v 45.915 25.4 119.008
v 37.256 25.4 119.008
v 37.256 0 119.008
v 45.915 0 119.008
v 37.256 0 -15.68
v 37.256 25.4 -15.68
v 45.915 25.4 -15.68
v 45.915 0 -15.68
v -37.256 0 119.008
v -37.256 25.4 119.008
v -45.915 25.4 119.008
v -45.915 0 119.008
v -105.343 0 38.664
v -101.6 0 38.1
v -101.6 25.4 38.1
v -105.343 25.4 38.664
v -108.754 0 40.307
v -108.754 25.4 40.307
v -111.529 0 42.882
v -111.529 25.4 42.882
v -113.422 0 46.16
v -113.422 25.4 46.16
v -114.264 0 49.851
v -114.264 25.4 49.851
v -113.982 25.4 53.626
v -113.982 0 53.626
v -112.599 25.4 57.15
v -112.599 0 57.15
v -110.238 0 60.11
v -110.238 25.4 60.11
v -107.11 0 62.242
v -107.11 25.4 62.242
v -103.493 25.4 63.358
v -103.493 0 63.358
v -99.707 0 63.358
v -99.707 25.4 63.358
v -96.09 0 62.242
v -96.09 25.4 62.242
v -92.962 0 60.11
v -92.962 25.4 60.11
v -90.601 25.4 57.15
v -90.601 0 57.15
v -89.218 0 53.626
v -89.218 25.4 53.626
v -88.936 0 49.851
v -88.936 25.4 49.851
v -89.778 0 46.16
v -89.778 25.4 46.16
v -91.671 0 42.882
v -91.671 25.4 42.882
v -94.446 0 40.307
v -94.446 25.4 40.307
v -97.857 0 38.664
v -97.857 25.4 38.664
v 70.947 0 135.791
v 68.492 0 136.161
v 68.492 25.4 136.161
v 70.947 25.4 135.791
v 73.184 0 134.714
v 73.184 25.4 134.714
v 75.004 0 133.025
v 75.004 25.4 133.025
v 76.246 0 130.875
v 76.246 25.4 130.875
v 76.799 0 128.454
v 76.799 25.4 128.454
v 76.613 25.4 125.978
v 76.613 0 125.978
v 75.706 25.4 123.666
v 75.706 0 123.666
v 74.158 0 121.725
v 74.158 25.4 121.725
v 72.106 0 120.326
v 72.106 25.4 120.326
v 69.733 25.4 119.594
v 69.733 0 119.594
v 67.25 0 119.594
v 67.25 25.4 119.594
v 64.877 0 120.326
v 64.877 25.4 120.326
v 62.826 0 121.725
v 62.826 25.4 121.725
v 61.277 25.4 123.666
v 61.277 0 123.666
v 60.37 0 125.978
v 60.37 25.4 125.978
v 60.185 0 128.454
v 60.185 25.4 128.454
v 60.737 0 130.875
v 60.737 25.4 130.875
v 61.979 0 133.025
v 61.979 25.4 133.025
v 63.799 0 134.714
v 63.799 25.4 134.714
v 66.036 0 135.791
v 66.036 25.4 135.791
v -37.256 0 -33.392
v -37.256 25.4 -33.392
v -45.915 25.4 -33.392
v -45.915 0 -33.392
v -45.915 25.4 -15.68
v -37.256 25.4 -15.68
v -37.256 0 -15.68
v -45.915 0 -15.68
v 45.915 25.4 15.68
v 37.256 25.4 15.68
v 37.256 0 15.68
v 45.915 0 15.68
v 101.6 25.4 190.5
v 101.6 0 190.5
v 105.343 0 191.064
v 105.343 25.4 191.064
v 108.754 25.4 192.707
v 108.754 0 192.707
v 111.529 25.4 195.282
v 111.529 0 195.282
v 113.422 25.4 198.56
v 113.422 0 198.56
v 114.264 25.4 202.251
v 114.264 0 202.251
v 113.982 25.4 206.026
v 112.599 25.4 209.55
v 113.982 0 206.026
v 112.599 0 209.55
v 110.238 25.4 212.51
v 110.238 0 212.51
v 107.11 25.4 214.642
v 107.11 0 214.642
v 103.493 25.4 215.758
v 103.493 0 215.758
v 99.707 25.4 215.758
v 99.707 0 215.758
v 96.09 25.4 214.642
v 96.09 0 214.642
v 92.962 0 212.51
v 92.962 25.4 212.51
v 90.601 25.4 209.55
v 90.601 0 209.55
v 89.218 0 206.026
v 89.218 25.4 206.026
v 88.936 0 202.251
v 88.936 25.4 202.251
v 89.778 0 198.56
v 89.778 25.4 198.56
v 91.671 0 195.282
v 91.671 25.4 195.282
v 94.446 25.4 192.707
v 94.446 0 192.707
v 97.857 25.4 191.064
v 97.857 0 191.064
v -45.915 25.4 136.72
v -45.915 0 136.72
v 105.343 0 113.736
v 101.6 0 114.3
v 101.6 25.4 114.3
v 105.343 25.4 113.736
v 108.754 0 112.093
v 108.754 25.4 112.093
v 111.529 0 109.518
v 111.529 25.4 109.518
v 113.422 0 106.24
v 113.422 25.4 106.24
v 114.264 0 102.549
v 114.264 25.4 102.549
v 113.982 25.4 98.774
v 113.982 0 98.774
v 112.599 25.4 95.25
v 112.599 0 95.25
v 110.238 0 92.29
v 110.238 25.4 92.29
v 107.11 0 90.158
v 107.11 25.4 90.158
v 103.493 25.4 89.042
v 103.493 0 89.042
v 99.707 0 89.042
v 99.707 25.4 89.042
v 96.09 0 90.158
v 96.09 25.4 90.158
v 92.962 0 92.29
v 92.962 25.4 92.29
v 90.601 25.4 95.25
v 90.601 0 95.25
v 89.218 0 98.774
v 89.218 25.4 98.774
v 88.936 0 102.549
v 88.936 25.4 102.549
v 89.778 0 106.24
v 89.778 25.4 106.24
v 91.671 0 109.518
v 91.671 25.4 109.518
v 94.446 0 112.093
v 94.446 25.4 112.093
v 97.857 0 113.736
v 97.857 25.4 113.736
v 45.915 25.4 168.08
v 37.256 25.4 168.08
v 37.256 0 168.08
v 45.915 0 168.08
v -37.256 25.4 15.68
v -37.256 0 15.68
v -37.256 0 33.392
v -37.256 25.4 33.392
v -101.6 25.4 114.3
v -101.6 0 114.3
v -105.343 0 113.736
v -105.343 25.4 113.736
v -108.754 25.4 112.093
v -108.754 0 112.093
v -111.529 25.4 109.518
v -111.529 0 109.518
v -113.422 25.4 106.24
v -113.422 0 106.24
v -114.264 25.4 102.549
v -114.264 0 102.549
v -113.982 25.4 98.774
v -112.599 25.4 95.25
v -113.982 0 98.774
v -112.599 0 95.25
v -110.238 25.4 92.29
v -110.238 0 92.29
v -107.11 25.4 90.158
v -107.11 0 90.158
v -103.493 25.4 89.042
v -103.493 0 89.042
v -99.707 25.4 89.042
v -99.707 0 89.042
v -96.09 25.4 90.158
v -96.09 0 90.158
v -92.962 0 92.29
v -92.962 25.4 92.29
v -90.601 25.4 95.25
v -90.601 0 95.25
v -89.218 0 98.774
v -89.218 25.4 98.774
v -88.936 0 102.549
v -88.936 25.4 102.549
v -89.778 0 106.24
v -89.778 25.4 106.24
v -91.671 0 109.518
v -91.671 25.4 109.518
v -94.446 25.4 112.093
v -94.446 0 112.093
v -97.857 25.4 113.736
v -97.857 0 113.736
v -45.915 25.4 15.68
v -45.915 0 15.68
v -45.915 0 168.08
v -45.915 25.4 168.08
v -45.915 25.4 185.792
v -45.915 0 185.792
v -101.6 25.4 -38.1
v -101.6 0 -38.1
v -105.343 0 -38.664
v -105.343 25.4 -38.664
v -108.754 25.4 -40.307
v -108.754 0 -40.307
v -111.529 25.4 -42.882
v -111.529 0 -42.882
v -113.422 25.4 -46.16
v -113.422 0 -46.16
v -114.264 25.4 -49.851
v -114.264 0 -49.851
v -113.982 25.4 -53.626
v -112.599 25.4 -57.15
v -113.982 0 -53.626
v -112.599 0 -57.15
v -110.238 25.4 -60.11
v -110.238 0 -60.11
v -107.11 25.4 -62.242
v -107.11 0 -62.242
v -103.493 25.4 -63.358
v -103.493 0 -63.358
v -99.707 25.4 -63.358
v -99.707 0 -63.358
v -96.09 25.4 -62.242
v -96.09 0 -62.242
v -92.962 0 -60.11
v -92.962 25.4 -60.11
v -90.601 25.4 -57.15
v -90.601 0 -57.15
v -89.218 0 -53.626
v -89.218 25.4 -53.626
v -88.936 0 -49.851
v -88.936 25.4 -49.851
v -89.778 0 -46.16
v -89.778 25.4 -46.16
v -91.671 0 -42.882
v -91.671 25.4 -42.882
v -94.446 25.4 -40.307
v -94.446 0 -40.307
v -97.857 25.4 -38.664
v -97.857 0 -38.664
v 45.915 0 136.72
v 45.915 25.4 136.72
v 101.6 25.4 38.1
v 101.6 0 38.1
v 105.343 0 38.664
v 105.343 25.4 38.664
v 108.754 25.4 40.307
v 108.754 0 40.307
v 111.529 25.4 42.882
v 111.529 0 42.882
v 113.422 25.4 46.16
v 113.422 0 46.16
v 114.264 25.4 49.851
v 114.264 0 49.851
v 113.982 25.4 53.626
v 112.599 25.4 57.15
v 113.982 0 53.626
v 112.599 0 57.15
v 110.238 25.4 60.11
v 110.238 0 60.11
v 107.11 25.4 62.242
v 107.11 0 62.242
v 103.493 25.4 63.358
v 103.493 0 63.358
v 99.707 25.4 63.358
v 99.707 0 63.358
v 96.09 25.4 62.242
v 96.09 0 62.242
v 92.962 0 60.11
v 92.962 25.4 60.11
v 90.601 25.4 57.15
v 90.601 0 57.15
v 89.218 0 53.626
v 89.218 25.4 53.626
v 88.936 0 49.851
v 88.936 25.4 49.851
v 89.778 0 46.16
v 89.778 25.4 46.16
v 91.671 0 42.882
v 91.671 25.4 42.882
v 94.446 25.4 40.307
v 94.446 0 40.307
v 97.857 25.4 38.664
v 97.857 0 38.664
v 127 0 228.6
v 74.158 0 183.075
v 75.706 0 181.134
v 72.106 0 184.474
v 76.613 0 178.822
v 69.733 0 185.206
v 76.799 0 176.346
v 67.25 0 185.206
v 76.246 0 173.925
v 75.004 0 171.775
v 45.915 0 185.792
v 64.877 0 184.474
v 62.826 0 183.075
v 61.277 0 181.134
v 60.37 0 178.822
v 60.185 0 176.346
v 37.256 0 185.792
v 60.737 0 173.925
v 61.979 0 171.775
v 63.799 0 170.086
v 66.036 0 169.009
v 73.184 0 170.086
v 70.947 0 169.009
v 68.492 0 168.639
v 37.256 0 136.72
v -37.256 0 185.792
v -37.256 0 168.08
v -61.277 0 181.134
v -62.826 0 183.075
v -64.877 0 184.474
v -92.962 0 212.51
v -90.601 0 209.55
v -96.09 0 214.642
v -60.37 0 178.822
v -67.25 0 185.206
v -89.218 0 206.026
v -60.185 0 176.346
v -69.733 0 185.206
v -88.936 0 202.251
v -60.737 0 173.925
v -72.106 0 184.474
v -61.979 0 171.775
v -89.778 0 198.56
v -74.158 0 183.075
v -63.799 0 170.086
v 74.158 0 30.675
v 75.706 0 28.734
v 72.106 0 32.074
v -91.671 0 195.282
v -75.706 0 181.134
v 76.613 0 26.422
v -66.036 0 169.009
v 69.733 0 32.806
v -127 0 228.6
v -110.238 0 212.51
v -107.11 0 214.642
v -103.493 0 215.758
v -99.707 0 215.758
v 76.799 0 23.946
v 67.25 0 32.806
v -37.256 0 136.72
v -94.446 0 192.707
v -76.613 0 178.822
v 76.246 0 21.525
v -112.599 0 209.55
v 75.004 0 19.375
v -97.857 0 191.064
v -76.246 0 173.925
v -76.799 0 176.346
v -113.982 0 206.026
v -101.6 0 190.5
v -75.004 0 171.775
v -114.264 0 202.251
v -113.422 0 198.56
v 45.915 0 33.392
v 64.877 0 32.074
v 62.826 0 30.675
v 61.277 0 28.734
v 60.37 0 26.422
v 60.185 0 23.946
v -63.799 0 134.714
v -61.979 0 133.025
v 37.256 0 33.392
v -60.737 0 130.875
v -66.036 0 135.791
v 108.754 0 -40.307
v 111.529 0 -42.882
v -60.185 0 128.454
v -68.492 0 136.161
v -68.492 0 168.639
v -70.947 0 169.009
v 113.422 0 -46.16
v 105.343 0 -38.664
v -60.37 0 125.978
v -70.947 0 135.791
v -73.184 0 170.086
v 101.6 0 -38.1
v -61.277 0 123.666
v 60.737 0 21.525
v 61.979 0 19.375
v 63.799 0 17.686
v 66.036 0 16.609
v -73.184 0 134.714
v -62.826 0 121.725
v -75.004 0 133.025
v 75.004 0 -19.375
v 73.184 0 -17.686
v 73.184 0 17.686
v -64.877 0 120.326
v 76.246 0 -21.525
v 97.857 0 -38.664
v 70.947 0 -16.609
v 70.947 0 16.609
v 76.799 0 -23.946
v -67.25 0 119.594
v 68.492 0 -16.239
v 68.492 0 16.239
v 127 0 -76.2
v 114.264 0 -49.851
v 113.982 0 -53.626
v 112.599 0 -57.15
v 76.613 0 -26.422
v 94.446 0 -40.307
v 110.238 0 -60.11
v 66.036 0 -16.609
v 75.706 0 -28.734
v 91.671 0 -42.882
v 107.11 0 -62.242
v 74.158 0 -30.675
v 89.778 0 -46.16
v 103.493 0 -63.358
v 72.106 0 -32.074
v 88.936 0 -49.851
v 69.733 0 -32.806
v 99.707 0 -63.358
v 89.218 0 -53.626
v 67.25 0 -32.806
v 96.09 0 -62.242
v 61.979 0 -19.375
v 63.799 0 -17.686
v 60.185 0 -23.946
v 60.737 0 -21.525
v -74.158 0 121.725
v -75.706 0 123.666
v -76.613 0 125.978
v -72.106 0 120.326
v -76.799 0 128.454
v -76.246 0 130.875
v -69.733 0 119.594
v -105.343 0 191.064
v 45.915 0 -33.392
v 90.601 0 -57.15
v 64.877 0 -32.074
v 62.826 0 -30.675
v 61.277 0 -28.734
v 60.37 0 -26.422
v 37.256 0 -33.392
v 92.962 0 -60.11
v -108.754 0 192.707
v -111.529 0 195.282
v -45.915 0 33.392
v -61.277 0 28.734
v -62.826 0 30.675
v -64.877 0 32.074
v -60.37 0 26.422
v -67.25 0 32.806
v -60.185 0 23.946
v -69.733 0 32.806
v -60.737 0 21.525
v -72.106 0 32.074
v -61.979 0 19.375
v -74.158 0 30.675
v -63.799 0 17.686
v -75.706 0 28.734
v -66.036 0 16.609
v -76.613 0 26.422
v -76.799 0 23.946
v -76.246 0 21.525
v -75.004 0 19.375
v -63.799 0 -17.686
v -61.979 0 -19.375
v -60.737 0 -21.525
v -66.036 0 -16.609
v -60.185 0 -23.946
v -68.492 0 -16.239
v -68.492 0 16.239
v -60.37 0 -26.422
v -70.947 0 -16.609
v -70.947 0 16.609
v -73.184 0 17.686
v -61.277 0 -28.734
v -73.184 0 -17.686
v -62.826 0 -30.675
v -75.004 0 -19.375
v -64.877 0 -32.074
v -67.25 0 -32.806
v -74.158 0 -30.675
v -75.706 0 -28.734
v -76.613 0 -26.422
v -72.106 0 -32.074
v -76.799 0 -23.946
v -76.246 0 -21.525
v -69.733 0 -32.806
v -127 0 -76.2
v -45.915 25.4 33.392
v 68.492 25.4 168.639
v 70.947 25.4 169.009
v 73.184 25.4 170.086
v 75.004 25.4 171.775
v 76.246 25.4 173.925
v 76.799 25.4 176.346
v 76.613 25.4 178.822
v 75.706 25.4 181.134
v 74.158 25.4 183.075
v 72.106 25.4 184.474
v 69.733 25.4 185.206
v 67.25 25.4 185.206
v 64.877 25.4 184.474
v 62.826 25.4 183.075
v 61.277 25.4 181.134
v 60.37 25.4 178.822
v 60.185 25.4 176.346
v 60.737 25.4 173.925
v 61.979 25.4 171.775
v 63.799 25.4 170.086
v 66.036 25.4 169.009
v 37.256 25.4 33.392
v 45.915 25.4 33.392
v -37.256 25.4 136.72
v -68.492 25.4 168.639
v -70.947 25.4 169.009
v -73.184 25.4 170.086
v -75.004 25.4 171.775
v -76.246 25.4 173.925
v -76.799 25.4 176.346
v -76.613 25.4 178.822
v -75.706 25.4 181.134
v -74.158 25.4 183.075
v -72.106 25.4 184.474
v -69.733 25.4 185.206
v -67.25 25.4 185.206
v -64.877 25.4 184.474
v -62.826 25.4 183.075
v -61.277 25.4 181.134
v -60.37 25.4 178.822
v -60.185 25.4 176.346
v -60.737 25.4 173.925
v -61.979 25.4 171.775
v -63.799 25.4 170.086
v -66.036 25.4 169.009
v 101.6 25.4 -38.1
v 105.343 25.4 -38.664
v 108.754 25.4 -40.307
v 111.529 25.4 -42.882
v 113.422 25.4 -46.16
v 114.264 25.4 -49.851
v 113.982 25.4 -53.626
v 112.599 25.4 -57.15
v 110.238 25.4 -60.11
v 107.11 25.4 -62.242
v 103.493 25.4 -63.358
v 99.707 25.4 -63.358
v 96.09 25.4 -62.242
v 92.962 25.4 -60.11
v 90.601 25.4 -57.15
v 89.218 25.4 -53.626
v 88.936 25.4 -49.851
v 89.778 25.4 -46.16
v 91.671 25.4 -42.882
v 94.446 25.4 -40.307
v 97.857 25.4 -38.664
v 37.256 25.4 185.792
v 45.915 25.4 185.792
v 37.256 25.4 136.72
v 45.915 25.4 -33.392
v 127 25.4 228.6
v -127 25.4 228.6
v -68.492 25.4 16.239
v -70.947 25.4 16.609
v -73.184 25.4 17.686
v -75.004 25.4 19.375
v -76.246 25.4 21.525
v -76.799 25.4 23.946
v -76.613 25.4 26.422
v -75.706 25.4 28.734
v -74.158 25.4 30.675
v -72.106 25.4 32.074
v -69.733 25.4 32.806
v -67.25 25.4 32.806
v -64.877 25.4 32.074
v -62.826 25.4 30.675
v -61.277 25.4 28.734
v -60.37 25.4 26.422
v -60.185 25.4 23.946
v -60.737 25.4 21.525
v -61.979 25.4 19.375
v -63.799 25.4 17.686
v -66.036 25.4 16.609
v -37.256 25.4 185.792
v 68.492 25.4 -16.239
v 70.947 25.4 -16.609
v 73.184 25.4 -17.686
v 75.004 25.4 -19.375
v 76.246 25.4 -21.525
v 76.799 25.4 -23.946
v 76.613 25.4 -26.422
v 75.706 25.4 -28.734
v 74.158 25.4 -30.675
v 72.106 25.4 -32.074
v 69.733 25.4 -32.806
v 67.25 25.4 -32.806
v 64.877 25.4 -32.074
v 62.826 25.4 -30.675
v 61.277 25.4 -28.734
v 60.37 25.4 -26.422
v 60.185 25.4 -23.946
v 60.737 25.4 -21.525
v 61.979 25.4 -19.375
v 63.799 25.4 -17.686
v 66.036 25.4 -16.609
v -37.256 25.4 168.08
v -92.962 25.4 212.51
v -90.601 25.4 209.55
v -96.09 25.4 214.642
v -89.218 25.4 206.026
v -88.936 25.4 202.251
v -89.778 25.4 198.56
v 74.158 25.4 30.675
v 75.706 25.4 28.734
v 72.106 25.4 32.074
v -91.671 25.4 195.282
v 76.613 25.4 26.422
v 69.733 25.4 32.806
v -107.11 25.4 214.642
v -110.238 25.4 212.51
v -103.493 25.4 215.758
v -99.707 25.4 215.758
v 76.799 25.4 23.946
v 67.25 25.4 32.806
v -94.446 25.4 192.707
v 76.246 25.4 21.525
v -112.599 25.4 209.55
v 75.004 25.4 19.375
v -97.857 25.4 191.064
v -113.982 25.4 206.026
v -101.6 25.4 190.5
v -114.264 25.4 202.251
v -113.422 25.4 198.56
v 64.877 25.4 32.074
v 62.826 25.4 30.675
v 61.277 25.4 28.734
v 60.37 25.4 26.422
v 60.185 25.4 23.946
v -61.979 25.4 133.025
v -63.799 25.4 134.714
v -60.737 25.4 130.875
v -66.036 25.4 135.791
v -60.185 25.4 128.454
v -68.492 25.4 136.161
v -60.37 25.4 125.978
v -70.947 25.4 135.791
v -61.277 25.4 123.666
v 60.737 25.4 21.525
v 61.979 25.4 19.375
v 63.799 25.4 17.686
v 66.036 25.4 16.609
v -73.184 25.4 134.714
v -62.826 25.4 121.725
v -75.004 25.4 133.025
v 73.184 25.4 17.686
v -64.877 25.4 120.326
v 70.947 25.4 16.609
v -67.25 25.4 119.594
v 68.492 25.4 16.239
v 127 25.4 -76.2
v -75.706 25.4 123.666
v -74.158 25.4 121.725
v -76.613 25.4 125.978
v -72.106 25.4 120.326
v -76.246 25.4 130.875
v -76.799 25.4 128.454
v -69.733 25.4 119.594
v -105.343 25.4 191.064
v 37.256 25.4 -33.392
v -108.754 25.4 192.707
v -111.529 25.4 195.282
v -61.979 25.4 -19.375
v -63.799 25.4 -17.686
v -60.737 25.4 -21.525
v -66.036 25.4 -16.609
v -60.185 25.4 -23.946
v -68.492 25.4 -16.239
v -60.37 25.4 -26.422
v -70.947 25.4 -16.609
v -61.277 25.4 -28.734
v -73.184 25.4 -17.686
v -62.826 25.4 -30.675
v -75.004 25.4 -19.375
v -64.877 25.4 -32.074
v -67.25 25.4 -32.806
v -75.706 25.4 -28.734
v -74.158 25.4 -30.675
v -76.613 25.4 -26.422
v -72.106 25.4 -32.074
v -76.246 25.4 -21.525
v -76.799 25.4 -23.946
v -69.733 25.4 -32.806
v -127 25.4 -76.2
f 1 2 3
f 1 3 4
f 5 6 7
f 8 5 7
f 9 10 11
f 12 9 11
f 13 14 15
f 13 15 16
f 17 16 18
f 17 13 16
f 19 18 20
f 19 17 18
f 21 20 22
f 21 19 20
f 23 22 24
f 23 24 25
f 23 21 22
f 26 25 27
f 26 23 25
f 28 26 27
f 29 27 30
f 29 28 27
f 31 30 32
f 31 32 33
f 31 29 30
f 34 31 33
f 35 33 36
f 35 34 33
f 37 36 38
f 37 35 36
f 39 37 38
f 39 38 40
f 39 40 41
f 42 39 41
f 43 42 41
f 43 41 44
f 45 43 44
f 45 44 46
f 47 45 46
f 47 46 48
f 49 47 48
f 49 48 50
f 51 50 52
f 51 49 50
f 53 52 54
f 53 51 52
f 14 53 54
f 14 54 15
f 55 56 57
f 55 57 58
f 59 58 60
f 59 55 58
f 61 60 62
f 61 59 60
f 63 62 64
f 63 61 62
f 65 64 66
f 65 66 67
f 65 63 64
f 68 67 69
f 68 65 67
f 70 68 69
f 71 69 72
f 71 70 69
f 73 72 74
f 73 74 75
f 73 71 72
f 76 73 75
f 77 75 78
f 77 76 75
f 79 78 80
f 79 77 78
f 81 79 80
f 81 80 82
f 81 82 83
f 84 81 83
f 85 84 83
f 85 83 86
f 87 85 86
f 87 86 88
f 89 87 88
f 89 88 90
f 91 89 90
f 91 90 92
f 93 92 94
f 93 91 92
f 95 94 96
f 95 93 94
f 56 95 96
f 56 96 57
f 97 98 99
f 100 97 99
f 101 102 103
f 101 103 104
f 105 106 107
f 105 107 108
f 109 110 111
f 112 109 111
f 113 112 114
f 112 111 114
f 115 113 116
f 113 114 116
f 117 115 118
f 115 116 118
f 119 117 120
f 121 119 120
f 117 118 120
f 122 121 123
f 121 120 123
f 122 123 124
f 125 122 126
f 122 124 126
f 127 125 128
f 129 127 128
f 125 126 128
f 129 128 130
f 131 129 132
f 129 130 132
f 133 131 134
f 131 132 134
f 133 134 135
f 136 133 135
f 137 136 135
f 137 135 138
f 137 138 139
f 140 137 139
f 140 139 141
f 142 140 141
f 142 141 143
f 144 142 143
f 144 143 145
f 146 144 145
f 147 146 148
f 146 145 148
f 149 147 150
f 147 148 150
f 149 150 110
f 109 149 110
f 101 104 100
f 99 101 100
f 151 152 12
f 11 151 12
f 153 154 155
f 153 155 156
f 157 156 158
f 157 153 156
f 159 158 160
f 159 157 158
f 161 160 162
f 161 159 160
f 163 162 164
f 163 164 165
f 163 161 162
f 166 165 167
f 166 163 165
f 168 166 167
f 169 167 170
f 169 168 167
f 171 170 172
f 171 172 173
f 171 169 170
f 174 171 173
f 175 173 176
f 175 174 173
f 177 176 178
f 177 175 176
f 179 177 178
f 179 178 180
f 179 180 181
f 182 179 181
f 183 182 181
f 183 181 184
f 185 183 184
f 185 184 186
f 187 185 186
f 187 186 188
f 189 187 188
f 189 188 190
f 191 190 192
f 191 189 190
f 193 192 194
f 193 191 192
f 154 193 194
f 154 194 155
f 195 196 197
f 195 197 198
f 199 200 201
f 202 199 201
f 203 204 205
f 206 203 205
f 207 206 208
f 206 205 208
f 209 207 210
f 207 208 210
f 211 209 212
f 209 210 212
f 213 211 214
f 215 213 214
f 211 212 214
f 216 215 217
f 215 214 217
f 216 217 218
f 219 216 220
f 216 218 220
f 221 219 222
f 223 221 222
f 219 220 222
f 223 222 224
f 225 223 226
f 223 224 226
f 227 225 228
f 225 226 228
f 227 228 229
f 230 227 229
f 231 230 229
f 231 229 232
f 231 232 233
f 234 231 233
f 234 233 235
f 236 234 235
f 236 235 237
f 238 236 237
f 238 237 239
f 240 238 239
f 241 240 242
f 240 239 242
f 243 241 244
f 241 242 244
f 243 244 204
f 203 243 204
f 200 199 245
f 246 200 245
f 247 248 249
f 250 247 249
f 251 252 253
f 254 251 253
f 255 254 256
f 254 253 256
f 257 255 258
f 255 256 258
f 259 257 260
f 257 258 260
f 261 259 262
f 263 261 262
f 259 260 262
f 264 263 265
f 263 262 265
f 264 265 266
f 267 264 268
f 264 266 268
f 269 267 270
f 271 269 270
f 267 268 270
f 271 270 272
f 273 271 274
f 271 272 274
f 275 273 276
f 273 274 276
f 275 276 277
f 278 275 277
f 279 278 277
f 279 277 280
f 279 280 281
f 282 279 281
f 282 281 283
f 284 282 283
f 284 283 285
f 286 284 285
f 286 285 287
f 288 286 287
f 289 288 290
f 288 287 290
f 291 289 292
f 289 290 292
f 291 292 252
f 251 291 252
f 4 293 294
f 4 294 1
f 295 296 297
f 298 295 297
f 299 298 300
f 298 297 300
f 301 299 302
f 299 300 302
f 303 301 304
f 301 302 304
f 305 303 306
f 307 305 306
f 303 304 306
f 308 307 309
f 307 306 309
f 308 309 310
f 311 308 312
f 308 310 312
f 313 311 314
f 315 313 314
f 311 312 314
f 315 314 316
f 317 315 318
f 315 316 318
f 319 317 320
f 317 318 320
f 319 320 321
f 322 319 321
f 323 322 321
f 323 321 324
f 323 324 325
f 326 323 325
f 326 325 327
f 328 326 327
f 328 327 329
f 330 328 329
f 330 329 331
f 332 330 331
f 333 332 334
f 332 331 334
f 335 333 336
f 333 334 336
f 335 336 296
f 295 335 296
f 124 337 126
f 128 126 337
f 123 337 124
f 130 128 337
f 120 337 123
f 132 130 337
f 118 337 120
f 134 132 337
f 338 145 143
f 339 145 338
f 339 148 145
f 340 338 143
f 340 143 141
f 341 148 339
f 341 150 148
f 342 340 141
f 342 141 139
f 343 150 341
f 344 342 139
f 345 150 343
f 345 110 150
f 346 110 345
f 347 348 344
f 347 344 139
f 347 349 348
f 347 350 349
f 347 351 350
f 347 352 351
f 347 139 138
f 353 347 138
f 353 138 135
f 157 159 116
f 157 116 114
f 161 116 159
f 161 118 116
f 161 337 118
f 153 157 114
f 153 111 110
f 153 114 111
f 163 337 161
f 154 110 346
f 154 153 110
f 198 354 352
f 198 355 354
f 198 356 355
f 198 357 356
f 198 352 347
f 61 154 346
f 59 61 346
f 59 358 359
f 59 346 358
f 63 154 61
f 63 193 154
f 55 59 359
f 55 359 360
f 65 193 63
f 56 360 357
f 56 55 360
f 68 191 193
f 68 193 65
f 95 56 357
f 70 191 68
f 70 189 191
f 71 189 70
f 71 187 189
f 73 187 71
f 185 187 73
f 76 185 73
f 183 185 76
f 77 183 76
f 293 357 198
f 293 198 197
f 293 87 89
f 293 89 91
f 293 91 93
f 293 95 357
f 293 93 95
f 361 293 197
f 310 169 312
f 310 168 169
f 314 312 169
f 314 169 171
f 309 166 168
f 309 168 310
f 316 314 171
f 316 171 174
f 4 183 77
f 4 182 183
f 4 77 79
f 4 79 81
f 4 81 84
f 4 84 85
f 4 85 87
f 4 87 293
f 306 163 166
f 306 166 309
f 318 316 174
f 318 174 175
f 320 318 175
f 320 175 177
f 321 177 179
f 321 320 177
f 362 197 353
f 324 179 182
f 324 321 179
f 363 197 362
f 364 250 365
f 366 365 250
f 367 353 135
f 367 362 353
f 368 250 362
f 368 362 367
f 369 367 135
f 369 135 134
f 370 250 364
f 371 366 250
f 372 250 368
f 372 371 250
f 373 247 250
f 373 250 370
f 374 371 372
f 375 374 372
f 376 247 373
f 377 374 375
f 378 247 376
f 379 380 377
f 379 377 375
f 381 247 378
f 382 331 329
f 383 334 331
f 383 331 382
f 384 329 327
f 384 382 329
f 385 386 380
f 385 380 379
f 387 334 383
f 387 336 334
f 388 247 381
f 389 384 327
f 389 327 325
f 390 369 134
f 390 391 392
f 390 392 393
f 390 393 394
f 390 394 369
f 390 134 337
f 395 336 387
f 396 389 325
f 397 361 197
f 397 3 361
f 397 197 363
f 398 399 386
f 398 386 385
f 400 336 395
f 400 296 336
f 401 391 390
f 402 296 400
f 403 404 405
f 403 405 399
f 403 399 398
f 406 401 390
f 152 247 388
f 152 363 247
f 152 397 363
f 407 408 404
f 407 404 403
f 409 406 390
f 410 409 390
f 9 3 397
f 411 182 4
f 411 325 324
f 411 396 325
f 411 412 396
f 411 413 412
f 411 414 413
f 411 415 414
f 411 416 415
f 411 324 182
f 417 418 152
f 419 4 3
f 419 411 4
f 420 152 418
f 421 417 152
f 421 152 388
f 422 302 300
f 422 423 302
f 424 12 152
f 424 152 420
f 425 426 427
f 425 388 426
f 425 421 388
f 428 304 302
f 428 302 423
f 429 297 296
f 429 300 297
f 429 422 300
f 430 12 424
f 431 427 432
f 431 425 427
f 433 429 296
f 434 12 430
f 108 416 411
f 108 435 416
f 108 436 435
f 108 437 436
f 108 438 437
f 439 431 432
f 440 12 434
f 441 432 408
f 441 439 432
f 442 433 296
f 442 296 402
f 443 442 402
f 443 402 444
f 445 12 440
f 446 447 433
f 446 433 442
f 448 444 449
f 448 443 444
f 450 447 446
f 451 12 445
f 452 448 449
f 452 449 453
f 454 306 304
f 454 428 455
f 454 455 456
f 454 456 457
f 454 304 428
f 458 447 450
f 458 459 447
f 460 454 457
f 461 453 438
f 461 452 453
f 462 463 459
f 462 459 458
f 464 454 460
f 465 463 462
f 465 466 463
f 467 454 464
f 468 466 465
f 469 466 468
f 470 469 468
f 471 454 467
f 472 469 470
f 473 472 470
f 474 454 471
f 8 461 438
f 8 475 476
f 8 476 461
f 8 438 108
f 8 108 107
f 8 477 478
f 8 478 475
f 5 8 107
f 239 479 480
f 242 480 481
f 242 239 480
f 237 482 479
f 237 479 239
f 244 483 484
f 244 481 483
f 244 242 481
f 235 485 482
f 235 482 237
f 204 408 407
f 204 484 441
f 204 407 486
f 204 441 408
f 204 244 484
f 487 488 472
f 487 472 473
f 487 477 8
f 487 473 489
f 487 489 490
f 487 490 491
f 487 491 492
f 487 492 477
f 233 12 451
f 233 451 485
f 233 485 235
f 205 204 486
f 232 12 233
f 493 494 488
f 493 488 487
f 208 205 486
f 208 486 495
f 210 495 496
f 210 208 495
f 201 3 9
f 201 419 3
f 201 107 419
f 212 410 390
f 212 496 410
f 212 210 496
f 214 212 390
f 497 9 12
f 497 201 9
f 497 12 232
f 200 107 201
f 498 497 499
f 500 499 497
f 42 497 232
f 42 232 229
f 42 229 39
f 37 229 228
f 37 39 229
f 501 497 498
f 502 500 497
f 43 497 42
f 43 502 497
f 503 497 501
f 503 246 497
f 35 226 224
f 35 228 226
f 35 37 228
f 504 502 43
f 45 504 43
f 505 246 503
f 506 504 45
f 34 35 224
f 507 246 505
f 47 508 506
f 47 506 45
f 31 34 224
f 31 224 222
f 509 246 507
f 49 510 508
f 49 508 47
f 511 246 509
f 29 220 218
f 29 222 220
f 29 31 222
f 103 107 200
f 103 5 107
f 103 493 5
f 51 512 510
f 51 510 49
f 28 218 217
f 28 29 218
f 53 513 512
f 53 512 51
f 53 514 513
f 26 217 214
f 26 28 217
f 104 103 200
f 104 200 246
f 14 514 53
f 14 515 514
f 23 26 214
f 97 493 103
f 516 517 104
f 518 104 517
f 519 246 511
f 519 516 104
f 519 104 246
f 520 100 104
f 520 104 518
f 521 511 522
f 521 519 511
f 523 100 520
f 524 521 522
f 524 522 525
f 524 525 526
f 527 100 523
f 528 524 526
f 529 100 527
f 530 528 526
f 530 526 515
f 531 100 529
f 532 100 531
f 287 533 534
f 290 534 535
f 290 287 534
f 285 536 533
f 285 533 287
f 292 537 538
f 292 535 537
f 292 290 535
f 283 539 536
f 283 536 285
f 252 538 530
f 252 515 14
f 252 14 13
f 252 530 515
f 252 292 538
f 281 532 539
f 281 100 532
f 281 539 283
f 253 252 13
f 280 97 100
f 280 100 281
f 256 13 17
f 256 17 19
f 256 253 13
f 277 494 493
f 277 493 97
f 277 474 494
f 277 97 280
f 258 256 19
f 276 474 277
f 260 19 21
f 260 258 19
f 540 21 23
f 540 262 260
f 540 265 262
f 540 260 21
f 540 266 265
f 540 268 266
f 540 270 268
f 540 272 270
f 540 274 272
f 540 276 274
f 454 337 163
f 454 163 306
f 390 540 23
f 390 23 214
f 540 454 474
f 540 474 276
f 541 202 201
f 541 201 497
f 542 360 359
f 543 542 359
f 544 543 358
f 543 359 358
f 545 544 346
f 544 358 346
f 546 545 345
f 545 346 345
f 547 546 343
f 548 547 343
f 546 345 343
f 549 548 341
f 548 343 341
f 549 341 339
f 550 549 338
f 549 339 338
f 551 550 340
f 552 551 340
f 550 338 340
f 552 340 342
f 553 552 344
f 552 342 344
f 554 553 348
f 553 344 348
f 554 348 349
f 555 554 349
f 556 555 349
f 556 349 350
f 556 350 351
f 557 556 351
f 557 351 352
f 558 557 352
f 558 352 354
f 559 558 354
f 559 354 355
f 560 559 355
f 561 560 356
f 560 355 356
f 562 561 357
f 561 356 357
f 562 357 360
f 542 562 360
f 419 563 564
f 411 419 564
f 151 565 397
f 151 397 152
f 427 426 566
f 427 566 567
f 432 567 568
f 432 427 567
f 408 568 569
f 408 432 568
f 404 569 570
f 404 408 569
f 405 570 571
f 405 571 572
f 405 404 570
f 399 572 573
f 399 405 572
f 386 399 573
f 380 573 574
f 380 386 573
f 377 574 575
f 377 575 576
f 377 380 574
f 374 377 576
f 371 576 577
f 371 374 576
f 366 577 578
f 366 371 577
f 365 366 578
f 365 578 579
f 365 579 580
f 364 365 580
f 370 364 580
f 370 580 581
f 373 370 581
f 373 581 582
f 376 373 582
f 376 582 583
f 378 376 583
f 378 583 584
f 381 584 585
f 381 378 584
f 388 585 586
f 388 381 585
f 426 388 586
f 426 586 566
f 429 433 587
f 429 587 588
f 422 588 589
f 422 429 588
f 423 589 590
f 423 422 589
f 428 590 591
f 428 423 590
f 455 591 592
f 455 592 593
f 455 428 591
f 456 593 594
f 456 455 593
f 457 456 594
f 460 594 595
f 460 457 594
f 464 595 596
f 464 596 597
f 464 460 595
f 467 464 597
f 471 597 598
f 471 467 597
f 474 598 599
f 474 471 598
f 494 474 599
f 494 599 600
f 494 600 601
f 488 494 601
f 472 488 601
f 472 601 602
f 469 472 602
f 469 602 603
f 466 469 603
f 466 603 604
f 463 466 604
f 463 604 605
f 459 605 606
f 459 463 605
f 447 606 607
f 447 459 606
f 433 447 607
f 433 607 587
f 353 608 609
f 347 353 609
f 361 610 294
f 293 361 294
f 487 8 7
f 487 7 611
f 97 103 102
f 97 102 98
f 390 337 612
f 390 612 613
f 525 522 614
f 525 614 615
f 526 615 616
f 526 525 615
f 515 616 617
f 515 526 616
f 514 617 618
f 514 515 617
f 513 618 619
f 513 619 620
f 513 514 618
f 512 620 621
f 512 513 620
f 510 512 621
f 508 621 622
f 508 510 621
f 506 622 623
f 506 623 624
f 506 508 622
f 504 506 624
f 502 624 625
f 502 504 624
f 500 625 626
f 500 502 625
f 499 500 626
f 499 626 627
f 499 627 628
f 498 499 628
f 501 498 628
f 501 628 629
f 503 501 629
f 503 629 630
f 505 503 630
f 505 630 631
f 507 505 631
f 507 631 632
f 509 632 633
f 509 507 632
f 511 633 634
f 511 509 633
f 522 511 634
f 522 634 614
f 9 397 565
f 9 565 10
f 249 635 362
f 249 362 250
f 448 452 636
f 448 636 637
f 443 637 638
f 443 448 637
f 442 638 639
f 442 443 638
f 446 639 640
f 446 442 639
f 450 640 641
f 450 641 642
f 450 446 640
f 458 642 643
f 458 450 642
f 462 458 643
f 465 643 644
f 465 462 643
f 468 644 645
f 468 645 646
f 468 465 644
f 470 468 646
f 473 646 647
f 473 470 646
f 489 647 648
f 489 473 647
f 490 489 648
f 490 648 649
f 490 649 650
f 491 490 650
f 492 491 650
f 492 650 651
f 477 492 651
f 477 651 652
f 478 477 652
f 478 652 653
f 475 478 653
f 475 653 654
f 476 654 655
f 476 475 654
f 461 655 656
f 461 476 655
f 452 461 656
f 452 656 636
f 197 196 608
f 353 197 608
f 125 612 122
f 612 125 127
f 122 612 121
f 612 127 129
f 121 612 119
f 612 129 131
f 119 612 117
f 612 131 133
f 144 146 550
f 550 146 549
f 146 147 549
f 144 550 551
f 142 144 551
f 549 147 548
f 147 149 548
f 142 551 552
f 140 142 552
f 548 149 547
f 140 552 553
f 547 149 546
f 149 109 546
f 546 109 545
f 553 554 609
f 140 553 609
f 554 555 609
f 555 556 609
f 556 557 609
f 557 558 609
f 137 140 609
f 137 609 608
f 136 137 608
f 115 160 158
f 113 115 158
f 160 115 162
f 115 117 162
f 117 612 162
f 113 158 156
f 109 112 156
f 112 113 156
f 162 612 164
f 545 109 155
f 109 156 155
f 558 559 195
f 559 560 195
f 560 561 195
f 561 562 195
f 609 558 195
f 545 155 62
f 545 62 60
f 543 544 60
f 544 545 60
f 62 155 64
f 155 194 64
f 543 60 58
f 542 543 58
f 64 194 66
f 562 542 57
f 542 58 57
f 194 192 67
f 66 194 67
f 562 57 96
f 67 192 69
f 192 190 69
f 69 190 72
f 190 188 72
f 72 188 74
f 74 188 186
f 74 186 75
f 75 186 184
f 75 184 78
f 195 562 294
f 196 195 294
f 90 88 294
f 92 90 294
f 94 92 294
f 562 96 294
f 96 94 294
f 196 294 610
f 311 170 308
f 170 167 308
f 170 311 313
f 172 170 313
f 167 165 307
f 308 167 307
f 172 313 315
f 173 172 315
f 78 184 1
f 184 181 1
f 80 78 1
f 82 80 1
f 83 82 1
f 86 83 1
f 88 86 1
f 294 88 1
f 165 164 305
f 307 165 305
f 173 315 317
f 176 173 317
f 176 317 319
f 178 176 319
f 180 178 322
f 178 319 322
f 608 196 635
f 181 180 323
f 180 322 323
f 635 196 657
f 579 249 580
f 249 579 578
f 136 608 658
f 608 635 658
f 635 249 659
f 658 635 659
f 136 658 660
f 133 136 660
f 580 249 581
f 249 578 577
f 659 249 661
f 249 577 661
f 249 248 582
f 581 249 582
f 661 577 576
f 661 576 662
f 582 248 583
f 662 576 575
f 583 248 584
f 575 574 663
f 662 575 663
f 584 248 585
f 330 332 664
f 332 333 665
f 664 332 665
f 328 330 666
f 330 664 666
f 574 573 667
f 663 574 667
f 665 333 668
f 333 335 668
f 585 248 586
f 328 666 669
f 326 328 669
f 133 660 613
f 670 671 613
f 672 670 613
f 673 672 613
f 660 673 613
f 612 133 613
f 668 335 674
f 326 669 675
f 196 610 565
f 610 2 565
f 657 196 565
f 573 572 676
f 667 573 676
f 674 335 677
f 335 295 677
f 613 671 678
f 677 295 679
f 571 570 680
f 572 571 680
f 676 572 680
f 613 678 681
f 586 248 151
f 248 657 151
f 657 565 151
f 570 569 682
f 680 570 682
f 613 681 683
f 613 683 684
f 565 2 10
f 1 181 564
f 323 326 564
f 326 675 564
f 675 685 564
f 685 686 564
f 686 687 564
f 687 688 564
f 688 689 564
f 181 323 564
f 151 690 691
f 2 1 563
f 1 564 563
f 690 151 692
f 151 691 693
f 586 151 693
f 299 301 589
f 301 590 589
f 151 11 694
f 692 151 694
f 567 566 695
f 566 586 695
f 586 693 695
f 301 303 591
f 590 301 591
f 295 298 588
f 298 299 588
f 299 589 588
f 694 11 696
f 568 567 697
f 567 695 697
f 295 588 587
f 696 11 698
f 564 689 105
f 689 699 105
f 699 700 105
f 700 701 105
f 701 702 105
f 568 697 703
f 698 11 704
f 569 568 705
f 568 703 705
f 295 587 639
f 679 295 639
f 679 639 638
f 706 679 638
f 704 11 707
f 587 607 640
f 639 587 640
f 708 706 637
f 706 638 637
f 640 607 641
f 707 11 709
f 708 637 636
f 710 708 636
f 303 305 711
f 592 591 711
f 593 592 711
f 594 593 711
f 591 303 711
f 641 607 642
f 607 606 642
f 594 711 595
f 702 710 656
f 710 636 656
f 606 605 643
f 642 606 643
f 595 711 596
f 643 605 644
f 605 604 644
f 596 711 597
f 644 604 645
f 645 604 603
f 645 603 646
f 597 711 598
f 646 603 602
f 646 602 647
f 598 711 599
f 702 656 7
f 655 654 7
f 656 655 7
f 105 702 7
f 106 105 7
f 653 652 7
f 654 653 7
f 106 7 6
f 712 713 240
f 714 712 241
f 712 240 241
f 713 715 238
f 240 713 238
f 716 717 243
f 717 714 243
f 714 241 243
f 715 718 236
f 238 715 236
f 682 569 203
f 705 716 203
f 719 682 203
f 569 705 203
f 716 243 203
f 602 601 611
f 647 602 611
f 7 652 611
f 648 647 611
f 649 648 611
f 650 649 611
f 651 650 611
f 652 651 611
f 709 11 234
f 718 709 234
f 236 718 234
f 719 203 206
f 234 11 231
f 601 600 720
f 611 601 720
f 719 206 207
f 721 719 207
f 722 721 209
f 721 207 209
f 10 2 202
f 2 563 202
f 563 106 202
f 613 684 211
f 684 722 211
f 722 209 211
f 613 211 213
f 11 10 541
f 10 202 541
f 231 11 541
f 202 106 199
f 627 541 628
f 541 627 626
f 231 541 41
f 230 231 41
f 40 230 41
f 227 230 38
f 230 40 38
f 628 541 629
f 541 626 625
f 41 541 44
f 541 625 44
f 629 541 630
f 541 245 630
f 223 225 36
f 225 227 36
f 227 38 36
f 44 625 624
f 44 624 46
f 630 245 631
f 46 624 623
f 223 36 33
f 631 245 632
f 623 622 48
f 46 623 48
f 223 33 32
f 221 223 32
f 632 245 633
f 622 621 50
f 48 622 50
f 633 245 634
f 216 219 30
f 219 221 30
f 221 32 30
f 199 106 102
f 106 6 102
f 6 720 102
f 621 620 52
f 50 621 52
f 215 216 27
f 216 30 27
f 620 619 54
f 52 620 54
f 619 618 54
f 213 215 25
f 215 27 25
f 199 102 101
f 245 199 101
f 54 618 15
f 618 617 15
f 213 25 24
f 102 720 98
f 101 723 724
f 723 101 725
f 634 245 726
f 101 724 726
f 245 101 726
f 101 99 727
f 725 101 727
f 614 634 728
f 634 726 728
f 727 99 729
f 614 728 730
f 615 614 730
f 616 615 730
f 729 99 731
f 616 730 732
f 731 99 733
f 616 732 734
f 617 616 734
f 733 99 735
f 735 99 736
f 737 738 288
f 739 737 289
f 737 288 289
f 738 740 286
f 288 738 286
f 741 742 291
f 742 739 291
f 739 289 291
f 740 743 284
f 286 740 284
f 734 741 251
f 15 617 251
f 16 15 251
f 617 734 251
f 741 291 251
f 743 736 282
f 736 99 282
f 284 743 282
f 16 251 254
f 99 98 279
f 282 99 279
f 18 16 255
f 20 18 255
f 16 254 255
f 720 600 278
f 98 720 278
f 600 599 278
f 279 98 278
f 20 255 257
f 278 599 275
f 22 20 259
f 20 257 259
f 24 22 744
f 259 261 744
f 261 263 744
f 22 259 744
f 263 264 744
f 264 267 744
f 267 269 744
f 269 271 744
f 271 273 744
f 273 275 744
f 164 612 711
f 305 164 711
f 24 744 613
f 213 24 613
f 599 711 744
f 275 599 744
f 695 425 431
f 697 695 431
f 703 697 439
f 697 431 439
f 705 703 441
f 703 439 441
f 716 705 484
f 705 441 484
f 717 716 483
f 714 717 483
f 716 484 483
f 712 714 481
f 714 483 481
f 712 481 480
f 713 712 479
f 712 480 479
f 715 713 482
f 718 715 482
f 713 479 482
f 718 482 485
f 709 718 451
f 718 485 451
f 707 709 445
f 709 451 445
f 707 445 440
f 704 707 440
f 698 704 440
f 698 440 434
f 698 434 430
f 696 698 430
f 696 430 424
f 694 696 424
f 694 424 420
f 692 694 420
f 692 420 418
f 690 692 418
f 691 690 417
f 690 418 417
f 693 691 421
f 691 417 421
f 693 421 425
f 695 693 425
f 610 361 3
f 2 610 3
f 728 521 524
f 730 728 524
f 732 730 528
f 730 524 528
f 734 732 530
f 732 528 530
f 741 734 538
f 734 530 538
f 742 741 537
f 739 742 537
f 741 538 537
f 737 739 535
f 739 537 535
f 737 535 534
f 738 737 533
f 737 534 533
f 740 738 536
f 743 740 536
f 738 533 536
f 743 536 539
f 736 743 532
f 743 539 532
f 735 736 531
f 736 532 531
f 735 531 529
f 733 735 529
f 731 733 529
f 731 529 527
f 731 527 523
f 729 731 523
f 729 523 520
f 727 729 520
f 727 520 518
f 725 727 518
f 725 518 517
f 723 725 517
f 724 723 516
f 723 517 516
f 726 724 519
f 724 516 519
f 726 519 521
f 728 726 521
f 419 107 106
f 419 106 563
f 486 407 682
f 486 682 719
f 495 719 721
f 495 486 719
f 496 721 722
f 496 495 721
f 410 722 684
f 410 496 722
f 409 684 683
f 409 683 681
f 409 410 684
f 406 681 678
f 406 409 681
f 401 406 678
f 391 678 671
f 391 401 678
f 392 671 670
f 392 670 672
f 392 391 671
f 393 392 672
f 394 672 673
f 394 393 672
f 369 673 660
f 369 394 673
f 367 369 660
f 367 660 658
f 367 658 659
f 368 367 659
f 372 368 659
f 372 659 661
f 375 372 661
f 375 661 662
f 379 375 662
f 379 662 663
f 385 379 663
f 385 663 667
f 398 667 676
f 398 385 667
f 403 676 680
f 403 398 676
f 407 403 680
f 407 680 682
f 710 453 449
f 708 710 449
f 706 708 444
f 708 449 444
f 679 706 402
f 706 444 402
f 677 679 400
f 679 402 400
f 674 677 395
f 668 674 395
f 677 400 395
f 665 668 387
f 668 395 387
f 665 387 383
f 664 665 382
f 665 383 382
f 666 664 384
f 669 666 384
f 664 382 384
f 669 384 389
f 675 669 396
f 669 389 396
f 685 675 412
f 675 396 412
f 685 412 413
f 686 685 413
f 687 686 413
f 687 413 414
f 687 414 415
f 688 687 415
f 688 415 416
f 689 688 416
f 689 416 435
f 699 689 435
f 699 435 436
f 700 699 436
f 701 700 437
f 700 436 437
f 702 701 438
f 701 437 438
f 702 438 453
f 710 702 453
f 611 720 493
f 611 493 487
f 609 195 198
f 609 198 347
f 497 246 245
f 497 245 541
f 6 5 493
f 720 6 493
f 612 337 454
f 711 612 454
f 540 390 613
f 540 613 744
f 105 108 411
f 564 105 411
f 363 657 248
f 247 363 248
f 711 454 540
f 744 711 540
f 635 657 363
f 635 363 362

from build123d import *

# Parameters (mm, degrees)
SKETCH1_W           = 127
SKETCH1_H           = 76.2
SKETCH1_R           = 8.33021032
SKETCH1_R_2         = 12.7
SKETCH1_W_2         = 8.659801889
SKETCH1_H_2         = 17.712025184
BOSS_EXTRUDE1_DEPTH = 25.4


with BuildPart() as part:
    # Sketch1 → Boss-Extrude1 (new body)
    with BuildSketch(Plane(origin=(0, 0, 0), x_dir=(1, 0, 0), z_dir=(0, 1, 0))):
        with Locations((63.5, 38.1)):
            Rectangle(SKETCH1_W, SKETCH1_H)
        with Locations(Location((68.491601229, 24.568808003, 0), (0, 0, 270))):
            Circle(SKETCH1_R, mode=Mode.SUBTRACT)
        with Locations(Location((101.6, 50.8, 0), (0, 0, 270))):
            Circle(SKETCH1_R_2, mode=Mode.SUBTRACT)
        with Locations((41.585480672, 24.535685835)):
            Rectangle(SKETCH1_W_2, SKETCH1_H_2, mode=Mode.SUBTRACT)
    extrude(amount=BOSS_EXTRUDE1_DEPTH)

    # Mirror1: part across plane


with BuildPart() as part_1:
    add(part.part)
    add(part.part.mirror(Plane(origin=(0, 25.4, 0), x_dir=(0, 0, 1), z_dir=(1, 0, 0))))

    # Mirror2: part across plane


with BuildPart() as part_2:
    add(part_1.part)
    add(part_1.part.mirror(Plane(origin=(0, 25.4, 0), x_dir=(1, 0, 0), z_dir=(0, 0, -1))))

    # Mirror3: part across face


with BuildPart() as part_3:
    add(part_2.part)
    add(part_2.part.mirror(Plane(origin=(0, 12.7, 76.2), x_dir=(1, 0, 0), z_dir=(0, 0, 1))))


solid = part_3.part
